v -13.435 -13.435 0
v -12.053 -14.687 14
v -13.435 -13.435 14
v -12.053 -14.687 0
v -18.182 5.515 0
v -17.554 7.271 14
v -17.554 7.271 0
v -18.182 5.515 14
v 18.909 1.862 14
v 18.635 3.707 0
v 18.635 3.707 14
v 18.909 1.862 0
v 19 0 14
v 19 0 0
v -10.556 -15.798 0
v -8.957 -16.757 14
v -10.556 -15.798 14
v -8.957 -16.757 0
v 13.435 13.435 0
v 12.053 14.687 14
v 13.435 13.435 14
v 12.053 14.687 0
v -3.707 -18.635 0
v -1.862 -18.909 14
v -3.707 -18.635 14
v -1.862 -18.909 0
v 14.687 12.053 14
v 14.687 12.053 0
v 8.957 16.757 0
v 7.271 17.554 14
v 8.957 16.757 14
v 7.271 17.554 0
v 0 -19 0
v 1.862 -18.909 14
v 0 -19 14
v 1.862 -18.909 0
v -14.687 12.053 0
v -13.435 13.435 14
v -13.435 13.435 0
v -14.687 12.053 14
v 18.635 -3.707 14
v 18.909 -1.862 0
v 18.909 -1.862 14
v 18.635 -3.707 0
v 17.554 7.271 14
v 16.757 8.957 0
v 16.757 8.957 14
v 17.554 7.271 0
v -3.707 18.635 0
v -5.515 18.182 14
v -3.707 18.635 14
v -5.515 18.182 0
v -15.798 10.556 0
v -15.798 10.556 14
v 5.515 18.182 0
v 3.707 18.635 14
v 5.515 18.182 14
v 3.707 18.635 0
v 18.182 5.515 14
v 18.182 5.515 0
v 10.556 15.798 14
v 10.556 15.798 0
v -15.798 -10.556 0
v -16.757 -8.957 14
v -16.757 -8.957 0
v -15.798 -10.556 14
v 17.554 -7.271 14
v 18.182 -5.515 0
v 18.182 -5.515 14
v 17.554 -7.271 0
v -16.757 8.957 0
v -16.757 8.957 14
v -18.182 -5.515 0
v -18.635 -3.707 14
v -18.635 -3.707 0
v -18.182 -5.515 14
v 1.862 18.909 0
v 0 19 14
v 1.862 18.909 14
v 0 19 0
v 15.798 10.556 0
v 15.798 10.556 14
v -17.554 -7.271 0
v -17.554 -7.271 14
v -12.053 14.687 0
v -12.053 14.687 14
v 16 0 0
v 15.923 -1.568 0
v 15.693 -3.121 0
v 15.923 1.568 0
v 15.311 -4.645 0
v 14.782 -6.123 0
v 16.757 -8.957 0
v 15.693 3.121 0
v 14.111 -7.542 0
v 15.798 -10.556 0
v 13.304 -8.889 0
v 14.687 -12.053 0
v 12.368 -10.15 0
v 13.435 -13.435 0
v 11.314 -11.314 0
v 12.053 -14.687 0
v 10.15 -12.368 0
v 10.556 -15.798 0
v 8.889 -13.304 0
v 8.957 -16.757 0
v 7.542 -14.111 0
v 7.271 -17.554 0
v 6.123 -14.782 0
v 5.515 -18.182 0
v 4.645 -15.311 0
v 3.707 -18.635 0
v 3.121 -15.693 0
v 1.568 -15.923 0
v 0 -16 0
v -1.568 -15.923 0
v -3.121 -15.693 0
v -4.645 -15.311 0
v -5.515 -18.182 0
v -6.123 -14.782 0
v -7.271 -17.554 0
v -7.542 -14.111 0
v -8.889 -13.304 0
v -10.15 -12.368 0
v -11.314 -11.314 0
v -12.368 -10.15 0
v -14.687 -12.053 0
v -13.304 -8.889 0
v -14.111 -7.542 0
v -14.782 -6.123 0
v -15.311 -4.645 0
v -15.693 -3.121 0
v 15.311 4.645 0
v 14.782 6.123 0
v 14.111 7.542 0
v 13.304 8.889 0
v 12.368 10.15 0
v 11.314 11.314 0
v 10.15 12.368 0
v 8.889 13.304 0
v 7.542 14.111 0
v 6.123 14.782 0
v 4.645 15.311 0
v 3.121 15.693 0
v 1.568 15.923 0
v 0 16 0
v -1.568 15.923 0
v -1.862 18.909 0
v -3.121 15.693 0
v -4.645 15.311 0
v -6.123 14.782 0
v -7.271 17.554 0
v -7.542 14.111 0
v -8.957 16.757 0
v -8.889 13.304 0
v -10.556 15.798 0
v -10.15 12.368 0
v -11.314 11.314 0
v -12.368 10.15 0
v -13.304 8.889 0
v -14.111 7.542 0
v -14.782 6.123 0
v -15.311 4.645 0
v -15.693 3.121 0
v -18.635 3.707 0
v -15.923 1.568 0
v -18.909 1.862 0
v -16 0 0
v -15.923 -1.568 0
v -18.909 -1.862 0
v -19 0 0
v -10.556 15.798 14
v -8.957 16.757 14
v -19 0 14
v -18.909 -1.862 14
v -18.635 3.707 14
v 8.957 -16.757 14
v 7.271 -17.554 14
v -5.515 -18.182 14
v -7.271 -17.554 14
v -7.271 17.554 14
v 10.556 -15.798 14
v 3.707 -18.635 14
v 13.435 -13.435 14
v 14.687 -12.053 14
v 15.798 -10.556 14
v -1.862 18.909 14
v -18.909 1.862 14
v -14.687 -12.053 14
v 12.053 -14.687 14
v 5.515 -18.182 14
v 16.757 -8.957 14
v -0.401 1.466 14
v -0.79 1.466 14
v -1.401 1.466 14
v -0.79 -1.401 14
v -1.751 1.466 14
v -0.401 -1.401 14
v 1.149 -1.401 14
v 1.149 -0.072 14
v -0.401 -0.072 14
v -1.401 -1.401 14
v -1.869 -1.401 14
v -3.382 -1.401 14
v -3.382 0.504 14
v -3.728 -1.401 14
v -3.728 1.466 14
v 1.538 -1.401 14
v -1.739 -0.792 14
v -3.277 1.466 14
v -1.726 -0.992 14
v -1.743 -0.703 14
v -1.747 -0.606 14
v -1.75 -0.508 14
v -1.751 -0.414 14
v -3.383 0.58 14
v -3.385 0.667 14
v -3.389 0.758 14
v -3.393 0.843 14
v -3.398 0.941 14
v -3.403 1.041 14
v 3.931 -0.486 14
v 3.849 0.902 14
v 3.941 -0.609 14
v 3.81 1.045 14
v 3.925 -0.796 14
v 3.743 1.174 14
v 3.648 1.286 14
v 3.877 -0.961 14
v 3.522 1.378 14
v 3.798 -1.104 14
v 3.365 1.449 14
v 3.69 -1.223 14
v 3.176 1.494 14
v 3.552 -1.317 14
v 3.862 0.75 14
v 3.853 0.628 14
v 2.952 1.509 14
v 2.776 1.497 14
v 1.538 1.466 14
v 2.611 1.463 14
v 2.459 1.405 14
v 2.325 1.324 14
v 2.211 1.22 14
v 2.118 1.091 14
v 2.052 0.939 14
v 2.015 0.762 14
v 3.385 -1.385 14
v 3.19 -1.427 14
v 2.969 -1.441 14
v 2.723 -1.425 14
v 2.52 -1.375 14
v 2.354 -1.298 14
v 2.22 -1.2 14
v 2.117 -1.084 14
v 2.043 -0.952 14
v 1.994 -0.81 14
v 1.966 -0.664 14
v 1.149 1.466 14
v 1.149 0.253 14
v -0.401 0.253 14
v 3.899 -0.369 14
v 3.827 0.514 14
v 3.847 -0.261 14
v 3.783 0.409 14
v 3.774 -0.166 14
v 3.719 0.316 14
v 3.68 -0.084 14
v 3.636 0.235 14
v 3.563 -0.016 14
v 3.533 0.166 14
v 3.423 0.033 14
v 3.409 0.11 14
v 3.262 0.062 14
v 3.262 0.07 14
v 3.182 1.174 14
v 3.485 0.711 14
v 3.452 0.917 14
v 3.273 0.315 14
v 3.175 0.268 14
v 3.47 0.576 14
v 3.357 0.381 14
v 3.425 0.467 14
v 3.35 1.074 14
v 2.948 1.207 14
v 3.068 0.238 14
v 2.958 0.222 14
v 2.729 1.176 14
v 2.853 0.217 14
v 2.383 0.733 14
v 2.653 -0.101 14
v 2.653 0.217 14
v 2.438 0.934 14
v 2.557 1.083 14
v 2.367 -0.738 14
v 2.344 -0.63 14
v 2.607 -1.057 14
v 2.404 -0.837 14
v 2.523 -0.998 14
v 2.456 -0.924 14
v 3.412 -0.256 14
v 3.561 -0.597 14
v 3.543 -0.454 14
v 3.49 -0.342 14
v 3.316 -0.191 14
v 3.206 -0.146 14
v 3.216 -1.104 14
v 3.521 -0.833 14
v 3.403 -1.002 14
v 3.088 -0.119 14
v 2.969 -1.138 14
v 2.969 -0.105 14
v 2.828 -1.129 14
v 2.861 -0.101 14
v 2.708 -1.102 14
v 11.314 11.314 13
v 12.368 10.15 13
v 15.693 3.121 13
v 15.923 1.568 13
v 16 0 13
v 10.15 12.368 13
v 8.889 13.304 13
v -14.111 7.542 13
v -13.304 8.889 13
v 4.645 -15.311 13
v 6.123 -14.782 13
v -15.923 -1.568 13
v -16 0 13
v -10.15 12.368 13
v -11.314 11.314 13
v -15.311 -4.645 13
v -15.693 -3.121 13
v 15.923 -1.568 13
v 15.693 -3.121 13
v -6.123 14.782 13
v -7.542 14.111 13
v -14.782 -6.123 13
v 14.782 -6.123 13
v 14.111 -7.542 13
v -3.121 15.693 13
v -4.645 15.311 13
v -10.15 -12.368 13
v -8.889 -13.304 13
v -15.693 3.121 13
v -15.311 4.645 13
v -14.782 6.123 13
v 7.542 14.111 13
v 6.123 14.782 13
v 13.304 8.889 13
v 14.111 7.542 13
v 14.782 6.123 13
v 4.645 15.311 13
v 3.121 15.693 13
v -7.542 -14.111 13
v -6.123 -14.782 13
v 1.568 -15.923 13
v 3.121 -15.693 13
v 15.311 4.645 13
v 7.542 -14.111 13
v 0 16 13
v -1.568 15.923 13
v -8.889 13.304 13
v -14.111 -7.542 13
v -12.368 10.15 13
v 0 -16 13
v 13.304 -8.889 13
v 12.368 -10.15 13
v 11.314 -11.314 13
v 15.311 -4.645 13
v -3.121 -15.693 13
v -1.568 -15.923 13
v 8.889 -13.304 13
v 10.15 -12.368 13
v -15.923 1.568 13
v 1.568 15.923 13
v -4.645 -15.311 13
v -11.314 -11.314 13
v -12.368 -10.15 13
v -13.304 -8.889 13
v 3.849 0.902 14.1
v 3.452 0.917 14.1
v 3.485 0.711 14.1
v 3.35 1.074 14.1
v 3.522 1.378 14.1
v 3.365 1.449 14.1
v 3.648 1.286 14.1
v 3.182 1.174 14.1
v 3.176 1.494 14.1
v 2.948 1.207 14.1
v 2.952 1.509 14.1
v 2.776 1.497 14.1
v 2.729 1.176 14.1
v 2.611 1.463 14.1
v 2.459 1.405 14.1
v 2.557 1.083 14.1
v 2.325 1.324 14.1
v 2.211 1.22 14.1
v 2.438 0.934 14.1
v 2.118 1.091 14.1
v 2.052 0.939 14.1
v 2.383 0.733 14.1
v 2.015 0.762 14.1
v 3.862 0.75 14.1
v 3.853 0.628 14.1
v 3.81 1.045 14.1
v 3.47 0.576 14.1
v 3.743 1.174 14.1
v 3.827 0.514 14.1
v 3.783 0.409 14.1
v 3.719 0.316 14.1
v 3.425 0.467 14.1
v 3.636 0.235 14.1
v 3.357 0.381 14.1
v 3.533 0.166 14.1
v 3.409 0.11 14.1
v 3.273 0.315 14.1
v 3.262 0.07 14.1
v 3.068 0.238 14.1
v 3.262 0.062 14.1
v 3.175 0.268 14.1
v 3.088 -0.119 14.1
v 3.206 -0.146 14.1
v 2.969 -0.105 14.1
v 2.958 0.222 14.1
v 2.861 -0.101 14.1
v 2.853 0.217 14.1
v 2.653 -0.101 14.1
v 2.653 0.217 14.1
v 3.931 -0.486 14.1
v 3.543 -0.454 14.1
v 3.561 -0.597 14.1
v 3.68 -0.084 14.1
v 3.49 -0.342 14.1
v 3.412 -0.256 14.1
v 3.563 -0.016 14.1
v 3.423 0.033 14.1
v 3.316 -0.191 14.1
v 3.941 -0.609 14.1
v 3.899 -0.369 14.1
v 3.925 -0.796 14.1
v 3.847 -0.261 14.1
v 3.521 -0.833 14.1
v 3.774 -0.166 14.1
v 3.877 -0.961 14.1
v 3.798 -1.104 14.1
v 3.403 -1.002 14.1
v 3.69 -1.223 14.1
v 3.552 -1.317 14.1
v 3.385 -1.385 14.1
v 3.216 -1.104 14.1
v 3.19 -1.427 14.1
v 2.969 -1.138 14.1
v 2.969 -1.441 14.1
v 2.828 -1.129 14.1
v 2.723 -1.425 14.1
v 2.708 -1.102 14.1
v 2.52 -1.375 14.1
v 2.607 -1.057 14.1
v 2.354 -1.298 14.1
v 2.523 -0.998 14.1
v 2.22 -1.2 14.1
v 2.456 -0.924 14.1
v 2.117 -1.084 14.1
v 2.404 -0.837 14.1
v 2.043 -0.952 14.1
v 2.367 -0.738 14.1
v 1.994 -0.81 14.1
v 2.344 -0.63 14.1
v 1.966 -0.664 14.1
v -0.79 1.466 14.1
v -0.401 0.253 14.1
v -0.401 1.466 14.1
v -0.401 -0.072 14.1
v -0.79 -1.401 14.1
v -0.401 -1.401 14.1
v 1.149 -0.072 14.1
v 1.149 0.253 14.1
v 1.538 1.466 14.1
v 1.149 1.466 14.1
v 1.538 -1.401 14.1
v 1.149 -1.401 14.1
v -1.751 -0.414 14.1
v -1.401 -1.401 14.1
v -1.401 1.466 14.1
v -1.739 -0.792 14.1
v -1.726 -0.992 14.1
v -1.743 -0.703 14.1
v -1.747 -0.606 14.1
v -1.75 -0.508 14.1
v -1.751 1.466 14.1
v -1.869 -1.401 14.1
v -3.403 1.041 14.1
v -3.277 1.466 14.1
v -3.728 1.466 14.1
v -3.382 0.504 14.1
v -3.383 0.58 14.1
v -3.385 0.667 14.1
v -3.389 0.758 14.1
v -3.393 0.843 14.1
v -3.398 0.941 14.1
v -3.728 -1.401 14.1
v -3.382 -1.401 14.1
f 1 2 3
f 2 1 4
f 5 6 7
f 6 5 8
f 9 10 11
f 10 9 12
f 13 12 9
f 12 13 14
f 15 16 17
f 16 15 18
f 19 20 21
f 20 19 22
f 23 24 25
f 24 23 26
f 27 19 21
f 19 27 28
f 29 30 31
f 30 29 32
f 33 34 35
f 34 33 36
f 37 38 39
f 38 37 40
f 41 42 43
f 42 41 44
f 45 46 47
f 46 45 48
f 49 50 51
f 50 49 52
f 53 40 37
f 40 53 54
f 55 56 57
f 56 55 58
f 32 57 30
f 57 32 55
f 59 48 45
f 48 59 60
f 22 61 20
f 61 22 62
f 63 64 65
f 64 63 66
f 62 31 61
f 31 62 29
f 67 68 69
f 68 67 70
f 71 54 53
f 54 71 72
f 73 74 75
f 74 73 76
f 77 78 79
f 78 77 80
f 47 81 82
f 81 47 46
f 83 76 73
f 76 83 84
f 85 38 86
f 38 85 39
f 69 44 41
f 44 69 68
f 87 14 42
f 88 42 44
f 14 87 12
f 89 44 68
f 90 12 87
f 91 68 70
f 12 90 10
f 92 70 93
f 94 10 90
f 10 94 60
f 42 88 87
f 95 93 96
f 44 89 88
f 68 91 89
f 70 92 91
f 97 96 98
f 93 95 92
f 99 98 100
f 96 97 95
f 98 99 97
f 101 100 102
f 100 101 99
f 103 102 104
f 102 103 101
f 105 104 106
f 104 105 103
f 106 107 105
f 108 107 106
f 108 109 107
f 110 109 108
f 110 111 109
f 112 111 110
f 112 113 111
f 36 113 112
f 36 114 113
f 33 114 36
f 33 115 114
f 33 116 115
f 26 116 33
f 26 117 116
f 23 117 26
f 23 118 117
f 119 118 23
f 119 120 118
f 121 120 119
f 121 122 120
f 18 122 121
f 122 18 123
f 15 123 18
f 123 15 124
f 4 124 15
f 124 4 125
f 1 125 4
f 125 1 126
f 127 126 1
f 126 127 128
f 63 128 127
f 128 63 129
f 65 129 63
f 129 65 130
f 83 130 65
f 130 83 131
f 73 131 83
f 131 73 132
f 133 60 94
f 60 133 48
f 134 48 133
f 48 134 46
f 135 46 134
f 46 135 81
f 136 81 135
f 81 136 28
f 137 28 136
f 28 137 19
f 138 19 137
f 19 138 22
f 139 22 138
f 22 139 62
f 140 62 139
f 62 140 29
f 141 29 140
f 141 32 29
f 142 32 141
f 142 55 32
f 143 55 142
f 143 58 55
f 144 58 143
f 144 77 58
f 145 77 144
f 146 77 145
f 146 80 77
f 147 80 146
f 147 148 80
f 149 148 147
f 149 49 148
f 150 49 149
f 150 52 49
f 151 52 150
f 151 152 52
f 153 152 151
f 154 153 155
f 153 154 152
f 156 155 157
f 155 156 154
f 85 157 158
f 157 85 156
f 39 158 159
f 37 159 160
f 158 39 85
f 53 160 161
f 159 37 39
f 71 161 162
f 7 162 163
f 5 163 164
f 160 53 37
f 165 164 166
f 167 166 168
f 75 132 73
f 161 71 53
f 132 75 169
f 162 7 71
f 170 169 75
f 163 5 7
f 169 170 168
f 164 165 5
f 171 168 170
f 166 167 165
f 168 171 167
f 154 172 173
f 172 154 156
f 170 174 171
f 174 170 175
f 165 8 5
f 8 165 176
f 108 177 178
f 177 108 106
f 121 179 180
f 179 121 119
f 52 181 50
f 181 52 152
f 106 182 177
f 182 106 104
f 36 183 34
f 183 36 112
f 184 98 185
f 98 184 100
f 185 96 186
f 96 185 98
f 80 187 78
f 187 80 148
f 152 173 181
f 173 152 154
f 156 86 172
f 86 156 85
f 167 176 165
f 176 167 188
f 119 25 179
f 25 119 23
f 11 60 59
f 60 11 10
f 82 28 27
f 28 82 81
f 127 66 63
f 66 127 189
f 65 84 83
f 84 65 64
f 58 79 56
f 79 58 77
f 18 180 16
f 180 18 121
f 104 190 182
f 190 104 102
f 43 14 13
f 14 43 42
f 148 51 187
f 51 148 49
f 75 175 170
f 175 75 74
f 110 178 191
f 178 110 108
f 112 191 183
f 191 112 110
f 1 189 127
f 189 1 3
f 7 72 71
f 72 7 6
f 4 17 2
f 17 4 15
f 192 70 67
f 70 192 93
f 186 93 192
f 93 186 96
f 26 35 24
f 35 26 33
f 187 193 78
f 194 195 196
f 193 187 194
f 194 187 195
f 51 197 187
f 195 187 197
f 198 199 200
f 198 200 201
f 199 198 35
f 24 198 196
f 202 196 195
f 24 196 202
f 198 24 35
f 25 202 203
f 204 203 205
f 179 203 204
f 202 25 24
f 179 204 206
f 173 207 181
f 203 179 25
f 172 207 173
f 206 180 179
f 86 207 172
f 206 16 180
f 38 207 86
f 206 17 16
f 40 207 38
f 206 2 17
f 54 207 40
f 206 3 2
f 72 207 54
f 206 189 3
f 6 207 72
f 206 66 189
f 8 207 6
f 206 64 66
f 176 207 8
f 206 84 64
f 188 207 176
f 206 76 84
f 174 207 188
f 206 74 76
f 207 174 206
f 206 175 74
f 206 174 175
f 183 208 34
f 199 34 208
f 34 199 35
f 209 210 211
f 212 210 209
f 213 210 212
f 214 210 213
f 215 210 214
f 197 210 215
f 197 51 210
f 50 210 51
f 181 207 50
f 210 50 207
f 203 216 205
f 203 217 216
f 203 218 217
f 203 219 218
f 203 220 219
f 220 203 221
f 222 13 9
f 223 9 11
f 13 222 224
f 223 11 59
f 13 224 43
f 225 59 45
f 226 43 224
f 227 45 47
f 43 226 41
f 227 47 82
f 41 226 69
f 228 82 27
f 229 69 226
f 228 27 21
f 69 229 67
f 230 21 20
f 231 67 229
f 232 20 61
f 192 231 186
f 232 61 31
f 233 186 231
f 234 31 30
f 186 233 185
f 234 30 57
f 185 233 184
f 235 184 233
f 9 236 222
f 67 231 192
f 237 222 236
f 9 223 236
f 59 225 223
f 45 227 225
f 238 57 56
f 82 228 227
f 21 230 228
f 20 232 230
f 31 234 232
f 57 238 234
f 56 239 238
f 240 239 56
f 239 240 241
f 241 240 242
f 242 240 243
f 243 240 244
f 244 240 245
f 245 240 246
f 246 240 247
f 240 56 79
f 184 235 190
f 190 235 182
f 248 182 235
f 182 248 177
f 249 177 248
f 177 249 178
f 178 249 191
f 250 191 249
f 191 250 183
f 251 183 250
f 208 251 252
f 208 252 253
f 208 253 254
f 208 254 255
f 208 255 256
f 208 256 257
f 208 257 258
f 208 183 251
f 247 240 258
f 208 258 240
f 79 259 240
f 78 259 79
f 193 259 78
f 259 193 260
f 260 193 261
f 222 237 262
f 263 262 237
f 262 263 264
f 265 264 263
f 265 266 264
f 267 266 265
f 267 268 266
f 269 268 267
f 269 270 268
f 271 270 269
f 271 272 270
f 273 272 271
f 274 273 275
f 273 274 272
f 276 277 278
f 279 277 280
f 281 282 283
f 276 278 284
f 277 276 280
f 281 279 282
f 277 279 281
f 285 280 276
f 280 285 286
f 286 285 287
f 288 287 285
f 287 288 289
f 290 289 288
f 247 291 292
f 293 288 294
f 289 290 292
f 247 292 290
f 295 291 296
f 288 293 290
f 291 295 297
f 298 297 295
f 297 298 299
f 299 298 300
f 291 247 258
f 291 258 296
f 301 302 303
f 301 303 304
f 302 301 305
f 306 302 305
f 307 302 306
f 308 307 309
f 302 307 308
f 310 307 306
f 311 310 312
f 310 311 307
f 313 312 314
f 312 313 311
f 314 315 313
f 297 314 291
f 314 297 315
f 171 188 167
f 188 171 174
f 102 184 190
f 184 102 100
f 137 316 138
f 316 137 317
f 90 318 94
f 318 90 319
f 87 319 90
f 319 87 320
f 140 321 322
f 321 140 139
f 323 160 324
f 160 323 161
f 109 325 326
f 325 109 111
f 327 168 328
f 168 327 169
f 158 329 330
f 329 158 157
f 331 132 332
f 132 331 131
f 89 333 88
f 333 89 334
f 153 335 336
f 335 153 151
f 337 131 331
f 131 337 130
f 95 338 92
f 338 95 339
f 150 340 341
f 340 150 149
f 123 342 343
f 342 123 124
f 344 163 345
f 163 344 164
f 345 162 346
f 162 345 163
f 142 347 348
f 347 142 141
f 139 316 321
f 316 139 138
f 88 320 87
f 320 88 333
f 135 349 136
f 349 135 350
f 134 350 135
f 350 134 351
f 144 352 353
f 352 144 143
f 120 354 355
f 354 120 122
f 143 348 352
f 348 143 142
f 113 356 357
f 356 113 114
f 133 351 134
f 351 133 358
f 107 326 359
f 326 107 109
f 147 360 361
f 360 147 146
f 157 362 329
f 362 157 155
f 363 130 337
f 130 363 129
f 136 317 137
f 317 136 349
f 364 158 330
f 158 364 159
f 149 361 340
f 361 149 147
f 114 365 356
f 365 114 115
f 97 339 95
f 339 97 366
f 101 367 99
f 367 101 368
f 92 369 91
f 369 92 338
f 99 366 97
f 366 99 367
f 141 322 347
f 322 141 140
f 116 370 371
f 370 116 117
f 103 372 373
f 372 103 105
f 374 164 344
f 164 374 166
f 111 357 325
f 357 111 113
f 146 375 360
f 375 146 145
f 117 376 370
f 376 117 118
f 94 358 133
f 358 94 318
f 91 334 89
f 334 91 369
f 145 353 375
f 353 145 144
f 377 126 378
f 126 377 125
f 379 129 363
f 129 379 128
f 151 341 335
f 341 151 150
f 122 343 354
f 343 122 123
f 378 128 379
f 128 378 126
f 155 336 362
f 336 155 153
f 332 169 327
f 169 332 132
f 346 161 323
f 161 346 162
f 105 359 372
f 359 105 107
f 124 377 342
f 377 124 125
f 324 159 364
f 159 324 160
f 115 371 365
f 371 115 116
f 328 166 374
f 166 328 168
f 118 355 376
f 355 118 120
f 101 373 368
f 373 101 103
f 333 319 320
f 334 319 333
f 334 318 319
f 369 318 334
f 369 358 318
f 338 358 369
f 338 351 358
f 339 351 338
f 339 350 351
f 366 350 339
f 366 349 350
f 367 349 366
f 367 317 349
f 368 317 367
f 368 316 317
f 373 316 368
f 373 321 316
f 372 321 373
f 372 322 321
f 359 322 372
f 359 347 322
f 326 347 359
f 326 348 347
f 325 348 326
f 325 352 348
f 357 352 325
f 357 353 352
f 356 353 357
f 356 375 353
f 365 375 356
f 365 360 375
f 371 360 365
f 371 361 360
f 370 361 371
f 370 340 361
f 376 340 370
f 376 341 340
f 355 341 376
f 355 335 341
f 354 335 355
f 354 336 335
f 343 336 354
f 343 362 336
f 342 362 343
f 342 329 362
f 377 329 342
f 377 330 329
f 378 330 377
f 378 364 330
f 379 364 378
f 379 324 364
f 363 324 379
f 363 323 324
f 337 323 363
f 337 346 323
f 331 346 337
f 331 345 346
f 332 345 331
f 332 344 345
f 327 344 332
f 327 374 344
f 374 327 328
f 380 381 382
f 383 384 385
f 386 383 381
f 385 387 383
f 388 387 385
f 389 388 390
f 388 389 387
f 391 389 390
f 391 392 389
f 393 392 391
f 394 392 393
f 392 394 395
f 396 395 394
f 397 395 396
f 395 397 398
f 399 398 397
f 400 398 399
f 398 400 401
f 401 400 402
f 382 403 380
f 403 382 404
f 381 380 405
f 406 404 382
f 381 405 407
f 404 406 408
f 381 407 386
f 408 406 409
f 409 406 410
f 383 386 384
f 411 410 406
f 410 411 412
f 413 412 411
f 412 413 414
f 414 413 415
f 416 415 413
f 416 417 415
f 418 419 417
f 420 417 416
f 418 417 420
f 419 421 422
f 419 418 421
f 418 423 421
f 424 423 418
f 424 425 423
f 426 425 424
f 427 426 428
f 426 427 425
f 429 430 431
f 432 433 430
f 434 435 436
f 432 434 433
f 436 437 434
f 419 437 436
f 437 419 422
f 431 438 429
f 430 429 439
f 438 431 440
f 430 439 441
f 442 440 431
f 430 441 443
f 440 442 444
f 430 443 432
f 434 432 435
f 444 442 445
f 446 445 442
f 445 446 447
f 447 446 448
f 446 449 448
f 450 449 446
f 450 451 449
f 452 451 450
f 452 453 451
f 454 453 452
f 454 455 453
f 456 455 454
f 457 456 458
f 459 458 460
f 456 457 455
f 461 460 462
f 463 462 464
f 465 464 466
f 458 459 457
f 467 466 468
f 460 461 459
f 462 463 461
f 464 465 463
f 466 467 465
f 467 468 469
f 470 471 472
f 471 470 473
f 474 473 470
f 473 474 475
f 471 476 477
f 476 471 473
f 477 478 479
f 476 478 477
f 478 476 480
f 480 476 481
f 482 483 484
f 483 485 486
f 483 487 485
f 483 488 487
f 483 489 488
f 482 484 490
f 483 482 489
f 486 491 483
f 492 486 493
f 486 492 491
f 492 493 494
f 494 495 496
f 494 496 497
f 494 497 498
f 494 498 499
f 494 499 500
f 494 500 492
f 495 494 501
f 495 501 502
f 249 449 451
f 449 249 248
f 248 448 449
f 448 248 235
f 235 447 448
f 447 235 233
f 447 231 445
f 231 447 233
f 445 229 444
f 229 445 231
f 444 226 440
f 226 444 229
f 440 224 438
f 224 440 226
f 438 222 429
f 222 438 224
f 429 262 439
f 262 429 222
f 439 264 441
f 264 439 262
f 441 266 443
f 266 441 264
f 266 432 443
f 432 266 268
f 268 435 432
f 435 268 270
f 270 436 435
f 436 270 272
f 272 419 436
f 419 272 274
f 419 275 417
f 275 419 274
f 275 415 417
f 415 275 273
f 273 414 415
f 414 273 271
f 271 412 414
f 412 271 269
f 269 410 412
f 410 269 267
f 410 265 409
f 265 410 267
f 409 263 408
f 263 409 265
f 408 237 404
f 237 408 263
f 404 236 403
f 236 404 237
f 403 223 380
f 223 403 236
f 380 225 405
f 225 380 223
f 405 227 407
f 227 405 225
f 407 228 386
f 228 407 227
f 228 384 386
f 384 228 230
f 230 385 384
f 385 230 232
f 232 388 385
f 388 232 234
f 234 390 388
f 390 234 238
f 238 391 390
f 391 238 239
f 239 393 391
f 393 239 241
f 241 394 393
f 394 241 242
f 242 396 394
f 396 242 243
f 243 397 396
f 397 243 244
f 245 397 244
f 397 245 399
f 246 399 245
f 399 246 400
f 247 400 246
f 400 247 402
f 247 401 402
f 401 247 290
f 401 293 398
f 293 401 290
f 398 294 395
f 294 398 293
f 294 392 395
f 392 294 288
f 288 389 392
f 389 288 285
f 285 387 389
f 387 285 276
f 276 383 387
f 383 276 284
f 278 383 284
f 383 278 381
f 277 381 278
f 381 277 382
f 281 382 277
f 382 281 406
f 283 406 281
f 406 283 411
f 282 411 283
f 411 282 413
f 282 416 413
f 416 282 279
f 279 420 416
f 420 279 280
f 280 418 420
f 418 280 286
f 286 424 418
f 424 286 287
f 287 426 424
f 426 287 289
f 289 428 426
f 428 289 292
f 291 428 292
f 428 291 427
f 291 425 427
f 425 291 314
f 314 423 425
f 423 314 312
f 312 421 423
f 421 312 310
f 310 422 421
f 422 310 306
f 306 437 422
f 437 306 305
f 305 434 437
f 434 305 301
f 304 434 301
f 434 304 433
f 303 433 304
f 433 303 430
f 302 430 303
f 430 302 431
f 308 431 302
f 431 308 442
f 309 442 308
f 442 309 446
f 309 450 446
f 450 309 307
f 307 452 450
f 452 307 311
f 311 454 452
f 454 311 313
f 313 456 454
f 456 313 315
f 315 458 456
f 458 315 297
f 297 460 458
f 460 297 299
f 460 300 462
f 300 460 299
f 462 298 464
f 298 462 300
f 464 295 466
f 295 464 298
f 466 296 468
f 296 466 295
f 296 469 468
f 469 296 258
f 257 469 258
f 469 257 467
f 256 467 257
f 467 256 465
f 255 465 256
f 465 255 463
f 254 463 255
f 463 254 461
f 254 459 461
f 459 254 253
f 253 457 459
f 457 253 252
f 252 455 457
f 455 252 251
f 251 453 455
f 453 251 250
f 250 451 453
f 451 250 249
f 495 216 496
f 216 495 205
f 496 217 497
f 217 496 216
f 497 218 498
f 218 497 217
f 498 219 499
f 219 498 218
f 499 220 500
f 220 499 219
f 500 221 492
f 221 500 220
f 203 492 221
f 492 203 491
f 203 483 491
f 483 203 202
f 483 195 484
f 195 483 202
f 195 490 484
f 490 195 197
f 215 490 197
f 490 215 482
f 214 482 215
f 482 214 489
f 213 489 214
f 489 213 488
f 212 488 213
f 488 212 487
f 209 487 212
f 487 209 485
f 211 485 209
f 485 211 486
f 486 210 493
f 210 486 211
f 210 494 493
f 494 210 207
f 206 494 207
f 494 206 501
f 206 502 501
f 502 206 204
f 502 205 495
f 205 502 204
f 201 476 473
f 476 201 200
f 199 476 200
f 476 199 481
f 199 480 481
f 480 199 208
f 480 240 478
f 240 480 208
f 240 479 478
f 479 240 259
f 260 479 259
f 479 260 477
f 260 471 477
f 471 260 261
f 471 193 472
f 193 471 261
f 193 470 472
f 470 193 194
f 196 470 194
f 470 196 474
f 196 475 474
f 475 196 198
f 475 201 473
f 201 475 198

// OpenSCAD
// GymStim salt cap — A5, Elite only. Replaceable consumable.
// 3-4 ml well, twist port, recessed warning mark on face.
// Body never touches ammonia → clean legal split.

OD = 38;
cap_h = 14;
well_d = 16;
well_h = 8;

module salt_cap() {
  difference() {
    cylinder(d=OD, h=cap_h, $fn=64);
    // twist port (bayonet)
    translate([0,0,-1]) cylinder(d=OD-6, h=cap_h+2, $fn=64);
    // well for salts
    translate([0,0,cap_h-well_h]) cylinder(d=well_d, h=well_h+1, $fn=48);
  }
  // detent click ring
  translate([0,0,cap_h-1]) cylinder(d=OD-1, h=1, $fn=64);
  // recessed warning mark (won't wear off)
  translate([0,0,cap_h-0.5]) linear_extrude(0.6)
    text("NH3", size=3, halign="center", valign="center");
}

salt_cap();
